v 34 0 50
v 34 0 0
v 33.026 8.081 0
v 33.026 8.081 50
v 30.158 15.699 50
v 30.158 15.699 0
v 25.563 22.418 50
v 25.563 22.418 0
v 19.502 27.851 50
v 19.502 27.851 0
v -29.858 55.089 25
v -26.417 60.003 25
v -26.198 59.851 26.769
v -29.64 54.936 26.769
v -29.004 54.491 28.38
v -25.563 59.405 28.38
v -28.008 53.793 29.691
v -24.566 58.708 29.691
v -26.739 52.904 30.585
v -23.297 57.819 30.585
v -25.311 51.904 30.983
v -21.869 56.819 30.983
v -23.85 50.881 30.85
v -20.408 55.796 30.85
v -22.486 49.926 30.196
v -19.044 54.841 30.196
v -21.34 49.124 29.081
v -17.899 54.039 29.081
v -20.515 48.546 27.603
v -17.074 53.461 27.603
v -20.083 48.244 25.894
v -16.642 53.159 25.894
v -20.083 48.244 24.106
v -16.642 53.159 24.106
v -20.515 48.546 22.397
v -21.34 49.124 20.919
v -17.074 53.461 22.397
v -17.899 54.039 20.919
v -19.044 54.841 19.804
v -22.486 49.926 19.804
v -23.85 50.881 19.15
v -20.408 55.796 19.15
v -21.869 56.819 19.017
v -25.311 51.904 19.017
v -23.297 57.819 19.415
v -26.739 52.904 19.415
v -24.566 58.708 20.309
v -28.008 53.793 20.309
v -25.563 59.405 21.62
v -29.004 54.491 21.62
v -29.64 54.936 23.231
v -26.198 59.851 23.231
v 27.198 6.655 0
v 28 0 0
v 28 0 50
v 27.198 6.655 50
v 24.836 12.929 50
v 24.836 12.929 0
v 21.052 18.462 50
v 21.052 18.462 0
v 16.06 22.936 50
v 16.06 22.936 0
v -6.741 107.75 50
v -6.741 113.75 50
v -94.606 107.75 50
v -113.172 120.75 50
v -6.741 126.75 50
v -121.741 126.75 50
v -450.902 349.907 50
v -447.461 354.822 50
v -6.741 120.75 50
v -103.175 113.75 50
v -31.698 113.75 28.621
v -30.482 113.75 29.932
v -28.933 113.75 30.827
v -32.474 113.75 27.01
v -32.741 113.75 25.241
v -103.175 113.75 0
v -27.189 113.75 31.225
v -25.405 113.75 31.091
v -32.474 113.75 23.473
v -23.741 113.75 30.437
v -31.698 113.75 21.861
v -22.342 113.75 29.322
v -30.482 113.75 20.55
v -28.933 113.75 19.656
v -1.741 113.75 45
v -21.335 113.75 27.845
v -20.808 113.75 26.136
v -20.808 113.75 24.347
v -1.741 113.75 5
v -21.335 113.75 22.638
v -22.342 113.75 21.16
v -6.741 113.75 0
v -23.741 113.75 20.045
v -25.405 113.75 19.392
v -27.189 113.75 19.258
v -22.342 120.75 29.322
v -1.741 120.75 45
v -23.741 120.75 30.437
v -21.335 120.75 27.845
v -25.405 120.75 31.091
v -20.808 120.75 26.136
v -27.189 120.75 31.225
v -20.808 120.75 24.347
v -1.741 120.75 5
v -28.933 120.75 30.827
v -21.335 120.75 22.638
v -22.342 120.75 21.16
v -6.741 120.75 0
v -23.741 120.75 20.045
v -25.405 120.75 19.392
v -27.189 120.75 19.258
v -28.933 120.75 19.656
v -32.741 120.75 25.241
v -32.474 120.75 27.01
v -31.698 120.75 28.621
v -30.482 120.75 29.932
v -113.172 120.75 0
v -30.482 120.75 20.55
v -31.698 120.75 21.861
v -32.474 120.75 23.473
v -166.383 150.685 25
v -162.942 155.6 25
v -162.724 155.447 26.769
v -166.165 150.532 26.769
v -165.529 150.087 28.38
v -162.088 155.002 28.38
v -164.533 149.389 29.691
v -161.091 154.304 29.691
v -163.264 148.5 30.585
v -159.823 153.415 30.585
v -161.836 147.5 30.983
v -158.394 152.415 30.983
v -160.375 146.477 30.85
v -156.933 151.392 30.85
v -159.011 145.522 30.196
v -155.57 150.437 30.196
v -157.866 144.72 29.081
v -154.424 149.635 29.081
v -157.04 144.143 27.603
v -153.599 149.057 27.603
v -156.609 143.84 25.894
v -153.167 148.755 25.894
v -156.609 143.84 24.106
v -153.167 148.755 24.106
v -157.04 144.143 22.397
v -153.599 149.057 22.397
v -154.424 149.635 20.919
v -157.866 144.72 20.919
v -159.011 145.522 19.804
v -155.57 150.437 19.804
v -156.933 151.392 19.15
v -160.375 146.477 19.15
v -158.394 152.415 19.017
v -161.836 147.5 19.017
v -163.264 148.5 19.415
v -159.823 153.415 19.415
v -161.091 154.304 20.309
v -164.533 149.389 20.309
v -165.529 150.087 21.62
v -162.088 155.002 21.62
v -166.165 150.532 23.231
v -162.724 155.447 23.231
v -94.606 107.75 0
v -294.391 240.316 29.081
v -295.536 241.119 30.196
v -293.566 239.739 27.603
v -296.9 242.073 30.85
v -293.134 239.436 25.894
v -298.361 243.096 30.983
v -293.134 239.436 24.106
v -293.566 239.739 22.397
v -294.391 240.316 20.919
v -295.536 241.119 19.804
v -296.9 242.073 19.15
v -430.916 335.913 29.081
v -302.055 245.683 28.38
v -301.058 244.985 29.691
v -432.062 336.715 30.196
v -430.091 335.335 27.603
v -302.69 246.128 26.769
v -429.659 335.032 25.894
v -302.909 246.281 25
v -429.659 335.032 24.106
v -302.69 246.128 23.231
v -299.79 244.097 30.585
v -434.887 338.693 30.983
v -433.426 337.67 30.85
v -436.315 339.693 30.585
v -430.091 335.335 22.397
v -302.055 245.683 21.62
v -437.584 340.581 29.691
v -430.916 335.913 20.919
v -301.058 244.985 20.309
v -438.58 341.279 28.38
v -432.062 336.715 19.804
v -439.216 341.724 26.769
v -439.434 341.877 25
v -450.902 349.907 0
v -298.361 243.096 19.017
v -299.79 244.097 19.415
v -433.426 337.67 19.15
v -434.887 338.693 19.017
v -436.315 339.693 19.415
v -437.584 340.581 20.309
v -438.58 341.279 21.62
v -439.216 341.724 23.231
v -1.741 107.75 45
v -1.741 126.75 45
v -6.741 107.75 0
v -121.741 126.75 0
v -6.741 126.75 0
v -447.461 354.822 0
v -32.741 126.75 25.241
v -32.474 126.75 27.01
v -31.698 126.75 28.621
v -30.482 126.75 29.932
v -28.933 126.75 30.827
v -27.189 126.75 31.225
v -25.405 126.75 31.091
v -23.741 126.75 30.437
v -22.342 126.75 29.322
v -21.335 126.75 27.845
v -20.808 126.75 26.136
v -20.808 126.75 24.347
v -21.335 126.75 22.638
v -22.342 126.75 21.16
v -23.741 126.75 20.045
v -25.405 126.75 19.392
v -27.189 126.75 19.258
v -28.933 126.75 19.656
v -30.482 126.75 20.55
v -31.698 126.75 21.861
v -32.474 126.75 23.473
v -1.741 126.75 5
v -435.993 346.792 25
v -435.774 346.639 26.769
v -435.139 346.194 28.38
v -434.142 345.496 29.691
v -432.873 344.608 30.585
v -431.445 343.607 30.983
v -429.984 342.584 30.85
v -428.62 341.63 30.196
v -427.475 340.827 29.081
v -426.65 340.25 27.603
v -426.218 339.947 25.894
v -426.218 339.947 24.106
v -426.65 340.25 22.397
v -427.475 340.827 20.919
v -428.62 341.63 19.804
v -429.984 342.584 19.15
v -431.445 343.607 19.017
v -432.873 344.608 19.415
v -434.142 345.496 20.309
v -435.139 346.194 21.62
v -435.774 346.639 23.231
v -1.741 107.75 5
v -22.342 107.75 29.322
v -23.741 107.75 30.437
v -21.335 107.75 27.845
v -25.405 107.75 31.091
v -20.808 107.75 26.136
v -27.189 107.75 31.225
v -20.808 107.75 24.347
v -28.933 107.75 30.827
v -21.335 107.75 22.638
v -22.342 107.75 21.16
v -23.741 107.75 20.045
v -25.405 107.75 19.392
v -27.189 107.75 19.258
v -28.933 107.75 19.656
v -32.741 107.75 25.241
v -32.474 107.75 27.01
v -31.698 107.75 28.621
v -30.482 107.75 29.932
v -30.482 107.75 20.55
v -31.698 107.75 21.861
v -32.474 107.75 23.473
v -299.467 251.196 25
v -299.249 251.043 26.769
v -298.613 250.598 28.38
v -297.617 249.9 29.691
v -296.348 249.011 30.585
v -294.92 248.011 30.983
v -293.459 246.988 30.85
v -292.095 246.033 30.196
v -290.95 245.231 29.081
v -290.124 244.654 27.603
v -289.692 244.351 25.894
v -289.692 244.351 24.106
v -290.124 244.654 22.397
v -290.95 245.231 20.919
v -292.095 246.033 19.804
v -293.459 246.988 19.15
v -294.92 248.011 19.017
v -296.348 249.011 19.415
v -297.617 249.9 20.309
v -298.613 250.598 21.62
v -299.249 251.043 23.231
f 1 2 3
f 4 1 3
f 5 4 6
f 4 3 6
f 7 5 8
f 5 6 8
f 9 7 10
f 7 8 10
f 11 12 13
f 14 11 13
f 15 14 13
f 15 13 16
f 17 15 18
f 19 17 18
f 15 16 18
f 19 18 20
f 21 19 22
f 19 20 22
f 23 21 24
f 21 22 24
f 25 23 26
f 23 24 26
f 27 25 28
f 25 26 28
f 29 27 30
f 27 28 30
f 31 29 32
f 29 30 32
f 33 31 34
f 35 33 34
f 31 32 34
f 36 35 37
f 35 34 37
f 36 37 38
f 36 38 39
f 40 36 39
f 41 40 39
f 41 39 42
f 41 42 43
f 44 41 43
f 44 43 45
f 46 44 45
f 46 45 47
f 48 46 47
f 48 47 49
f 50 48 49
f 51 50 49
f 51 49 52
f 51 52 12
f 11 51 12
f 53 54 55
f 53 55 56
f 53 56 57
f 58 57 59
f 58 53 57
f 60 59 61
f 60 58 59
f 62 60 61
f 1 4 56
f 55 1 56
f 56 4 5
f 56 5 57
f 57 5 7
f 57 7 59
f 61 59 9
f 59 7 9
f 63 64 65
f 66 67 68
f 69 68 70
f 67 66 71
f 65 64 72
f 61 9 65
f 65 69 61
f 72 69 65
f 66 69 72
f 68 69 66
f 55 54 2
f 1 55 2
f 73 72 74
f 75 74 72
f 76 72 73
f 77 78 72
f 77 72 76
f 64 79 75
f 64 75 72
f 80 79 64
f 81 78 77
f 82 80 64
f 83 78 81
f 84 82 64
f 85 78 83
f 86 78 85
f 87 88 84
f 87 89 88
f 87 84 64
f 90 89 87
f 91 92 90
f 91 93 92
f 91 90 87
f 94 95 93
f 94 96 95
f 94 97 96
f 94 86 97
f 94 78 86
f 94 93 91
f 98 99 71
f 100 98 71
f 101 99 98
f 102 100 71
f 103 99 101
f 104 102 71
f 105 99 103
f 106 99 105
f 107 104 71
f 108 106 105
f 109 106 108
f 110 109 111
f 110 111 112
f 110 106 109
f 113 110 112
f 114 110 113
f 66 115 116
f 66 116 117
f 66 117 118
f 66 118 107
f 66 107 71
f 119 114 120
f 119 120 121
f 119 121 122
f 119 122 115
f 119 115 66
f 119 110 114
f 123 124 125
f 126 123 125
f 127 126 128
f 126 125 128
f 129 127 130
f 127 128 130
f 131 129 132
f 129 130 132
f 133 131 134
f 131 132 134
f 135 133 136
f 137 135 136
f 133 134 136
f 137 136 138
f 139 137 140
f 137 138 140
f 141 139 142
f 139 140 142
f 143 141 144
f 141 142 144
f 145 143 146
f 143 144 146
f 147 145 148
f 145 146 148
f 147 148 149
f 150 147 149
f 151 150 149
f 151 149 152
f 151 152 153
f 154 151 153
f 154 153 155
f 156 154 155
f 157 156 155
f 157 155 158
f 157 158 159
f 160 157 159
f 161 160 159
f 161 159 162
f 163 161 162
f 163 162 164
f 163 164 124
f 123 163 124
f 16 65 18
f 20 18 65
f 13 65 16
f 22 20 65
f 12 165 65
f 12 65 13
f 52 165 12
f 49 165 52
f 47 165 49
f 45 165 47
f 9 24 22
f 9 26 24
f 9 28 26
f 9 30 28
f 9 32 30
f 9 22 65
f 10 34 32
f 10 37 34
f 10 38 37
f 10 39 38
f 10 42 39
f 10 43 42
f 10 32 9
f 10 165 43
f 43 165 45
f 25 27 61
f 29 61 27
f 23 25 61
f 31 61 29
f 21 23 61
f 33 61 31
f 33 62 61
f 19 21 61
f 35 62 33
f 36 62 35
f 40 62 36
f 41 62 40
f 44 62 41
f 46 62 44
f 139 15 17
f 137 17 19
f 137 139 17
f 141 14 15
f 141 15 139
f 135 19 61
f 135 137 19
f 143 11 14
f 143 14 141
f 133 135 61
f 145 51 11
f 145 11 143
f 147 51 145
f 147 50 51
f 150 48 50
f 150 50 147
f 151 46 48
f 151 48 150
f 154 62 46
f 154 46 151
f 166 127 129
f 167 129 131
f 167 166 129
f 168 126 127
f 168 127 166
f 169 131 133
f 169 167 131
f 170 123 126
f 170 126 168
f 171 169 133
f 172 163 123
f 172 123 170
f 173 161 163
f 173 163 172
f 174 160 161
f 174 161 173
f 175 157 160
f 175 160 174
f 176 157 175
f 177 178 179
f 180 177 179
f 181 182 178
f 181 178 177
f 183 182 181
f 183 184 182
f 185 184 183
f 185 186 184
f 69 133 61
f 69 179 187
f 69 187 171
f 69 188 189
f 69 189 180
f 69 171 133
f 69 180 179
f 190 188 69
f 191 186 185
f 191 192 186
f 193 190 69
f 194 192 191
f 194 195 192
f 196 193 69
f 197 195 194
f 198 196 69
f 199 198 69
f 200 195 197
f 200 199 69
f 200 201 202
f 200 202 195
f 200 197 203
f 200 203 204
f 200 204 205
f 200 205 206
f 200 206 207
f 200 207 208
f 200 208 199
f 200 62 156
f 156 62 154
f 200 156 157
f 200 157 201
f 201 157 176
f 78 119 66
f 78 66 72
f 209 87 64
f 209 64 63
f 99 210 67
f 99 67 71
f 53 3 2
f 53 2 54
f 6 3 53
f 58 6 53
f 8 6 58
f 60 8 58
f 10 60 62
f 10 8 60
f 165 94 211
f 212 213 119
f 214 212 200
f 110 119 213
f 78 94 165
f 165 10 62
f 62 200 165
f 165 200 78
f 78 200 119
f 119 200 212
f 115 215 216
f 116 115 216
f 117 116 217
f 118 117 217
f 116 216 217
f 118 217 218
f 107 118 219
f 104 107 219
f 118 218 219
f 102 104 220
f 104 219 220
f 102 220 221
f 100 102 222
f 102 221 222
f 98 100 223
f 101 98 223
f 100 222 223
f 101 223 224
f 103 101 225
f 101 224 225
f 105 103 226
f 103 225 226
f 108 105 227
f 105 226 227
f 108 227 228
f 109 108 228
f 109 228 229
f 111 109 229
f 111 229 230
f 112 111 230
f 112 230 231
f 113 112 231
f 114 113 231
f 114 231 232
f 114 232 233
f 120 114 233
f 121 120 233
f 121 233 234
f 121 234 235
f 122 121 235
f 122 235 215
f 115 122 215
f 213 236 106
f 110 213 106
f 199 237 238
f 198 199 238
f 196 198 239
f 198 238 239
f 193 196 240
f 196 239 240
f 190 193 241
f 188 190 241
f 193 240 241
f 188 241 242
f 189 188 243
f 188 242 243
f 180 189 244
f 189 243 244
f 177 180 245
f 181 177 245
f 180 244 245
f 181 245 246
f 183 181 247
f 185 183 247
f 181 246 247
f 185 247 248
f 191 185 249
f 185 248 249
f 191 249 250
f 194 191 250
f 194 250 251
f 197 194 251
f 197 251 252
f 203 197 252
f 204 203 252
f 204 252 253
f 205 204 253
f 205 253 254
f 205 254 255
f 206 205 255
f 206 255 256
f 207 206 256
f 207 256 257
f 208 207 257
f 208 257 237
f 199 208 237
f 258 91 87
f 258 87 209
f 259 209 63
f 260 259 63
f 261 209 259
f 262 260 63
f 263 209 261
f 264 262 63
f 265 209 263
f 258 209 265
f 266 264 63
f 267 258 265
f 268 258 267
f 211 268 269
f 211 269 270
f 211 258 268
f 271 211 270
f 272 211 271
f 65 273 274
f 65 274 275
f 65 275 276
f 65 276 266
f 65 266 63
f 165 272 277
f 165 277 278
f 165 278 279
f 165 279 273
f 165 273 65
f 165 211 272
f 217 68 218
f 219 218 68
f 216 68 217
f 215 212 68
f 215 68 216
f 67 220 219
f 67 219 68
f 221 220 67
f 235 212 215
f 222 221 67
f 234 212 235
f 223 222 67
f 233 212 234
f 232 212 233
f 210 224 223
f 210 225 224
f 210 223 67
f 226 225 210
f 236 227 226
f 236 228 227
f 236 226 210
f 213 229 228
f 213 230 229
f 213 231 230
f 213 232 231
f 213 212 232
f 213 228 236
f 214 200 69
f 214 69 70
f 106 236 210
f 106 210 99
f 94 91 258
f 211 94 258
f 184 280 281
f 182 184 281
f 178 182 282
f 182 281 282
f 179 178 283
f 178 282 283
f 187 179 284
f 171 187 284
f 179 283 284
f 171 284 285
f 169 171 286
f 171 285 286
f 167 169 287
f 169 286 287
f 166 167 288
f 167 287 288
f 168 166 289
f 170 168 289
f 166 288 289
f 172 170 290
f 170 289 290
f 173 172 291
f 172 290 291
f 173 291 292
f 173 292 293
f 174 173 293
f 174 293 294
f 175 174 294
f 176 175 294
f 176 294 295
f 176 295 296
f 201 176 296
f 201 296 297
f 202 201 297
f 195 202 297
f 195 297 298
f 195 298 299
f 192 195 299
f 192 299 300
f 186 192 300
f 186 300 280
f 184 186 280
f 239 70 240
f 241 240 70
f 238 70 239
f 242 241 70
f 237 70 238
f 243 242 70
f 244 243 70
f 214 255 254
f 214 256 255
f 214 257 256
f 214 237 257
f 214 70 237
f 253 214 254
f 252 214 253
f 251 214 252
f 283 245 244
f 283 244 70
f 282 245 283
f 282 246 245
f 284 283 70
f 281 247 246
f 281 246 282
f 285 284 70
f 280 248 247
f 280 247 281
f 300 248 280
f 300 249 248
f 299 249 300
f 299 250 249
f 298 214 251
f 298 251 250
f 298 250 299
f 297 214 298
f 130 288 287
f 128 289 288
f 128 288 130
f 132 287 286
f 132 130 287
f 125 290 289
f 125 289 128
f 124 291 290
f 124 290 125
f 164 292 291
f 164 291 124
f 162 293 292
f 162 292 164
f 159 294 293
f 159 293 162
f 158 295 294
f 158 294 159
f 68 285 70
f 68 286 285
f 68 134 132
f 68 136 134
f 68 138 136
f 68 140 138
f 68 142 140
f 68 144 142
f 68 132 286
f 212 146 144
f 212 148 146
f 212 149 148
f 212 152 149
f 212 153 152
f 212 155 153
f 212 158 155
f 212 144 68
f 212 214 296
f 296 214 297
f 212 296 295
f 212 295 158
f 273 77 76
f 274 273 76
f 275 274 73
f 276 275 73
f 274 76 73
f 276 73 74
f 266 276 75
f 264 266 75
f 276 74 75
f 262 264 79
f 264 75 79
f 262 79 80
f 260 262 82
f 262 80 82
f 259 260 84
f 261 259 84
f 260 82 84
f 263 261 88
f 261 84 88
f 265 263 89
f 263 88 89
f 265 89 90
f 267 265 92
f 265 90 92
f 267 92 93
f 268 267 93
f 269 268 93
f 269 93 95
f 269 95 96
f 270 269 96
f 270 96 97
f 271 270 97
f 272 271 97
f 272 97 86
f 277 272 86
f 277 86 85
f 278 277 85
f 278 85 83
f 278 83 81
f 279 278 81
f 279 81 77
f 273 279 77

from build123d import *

# Parameters (mm, degrees)
PAD_DEPTH           = 50
PAD001_DEPTH        = 50
CHAMFER_SIZE        = 5
SKETCH002_R         = 6
POCKET_DEPTH        = 30
SKETCH015_R         = 6
POCKET005_DEPTH     = 292.6279206635
LINEARPATTERN_COUNT = 4
LINEARPATTERN_PITCH = 166.6666666667


with BuildPart() as part:
    # Sketch → Pad (new body)
    with BuildSketch(Plane.XY):
        with BuildLine():
            Line((-447.460817474, 354.8217734667), (19.5015988359, 27.8511695058))
            ThreePointArc((34, 0), (30.1583683281, 15.69945285), (19.5015988359, 27.8511695058))
            Line((28, 0), (34, 0))
            ThreePointArc((28, 0), (24.836303329, 12.9289611706), (16.0601402178, 22.9362572401))
            Line((16.0601402178, 22.9362572401), (-450.9022760922, 349.906861201))
            Line((-450.9022760922, 349.906861201), (-447.460817474, 354.8217734667))
        make_face()
    extrude(amount=PAD_DEPTH)

    # Sketch001 → Pad001 (join)
    with BuildSketch(Plane.XY):
        Polygon((-94.6057566753, 107.75), (-103.1746447158, 113.75), (-1.7405688034, 113.75), (-1.7405688034, 107.75), align=None)
        Polygon((-113.171680763, 120.75), (-121.7405688034, 126.75), (-1.7405688034, 126.75), (-1.7405688034, 120.75), align=None)
    extrude(amount=PAD001_DEPTH)

    # Chamfer
    chamfer_edges = [part.edges().sort_by_distance(p)[0] for p in [
        (-1.740569, 123.75, 50),
        (-1.740569, 110.75, 50),
        (-1.740569, 110.75, 0),
        (-1.740569, 123.75, 0),
    ]]
    chamfer(chamfer_edges, length=CHAMFER_SIZE)

    # Sketch002 (on Face1 of Chamfer) → Pocket (cut)
    with BuildSketch(Plane(origin=(0, 126.75, 0), x_dir=(-1, 0, 0), z_dir=(0, 1, 0))):
        with Locations((26.7405688034, 25.24131)):
            Circle(SKETCH002_R)
    extrude(amount=-POCKET_DEPTH, mode=Mode.SUBTRACT)

    # Sketch015 → Pocket005 (cut, through all)
    with BuildSketch(Plane(origin=(19.5015988359, 27.8511695058, 0), x_dir=(-0.8191520443, 0.5735764364, 0), z_dir=(0.5735764364, 0.8191520443, 0))):
        with Locations((550.0558517379, 25)):
            Circle(SKETCH015_R)
    pocket005 = extrude(amount=-POCKET005_DEPTH, mode=Mode.SUBTRACT)

    # LinearPattern: Pocket005 ×4
    with Locations(*[Vector(0.8191520443, -0.5735764364, 0) * (i * LINEARPATTERN_PITCH) for i in range(1, LINEARPATTERN_COUNT)]):
        add(pocket005, mode=Mode.SUBTRACT)


solid = part.part
